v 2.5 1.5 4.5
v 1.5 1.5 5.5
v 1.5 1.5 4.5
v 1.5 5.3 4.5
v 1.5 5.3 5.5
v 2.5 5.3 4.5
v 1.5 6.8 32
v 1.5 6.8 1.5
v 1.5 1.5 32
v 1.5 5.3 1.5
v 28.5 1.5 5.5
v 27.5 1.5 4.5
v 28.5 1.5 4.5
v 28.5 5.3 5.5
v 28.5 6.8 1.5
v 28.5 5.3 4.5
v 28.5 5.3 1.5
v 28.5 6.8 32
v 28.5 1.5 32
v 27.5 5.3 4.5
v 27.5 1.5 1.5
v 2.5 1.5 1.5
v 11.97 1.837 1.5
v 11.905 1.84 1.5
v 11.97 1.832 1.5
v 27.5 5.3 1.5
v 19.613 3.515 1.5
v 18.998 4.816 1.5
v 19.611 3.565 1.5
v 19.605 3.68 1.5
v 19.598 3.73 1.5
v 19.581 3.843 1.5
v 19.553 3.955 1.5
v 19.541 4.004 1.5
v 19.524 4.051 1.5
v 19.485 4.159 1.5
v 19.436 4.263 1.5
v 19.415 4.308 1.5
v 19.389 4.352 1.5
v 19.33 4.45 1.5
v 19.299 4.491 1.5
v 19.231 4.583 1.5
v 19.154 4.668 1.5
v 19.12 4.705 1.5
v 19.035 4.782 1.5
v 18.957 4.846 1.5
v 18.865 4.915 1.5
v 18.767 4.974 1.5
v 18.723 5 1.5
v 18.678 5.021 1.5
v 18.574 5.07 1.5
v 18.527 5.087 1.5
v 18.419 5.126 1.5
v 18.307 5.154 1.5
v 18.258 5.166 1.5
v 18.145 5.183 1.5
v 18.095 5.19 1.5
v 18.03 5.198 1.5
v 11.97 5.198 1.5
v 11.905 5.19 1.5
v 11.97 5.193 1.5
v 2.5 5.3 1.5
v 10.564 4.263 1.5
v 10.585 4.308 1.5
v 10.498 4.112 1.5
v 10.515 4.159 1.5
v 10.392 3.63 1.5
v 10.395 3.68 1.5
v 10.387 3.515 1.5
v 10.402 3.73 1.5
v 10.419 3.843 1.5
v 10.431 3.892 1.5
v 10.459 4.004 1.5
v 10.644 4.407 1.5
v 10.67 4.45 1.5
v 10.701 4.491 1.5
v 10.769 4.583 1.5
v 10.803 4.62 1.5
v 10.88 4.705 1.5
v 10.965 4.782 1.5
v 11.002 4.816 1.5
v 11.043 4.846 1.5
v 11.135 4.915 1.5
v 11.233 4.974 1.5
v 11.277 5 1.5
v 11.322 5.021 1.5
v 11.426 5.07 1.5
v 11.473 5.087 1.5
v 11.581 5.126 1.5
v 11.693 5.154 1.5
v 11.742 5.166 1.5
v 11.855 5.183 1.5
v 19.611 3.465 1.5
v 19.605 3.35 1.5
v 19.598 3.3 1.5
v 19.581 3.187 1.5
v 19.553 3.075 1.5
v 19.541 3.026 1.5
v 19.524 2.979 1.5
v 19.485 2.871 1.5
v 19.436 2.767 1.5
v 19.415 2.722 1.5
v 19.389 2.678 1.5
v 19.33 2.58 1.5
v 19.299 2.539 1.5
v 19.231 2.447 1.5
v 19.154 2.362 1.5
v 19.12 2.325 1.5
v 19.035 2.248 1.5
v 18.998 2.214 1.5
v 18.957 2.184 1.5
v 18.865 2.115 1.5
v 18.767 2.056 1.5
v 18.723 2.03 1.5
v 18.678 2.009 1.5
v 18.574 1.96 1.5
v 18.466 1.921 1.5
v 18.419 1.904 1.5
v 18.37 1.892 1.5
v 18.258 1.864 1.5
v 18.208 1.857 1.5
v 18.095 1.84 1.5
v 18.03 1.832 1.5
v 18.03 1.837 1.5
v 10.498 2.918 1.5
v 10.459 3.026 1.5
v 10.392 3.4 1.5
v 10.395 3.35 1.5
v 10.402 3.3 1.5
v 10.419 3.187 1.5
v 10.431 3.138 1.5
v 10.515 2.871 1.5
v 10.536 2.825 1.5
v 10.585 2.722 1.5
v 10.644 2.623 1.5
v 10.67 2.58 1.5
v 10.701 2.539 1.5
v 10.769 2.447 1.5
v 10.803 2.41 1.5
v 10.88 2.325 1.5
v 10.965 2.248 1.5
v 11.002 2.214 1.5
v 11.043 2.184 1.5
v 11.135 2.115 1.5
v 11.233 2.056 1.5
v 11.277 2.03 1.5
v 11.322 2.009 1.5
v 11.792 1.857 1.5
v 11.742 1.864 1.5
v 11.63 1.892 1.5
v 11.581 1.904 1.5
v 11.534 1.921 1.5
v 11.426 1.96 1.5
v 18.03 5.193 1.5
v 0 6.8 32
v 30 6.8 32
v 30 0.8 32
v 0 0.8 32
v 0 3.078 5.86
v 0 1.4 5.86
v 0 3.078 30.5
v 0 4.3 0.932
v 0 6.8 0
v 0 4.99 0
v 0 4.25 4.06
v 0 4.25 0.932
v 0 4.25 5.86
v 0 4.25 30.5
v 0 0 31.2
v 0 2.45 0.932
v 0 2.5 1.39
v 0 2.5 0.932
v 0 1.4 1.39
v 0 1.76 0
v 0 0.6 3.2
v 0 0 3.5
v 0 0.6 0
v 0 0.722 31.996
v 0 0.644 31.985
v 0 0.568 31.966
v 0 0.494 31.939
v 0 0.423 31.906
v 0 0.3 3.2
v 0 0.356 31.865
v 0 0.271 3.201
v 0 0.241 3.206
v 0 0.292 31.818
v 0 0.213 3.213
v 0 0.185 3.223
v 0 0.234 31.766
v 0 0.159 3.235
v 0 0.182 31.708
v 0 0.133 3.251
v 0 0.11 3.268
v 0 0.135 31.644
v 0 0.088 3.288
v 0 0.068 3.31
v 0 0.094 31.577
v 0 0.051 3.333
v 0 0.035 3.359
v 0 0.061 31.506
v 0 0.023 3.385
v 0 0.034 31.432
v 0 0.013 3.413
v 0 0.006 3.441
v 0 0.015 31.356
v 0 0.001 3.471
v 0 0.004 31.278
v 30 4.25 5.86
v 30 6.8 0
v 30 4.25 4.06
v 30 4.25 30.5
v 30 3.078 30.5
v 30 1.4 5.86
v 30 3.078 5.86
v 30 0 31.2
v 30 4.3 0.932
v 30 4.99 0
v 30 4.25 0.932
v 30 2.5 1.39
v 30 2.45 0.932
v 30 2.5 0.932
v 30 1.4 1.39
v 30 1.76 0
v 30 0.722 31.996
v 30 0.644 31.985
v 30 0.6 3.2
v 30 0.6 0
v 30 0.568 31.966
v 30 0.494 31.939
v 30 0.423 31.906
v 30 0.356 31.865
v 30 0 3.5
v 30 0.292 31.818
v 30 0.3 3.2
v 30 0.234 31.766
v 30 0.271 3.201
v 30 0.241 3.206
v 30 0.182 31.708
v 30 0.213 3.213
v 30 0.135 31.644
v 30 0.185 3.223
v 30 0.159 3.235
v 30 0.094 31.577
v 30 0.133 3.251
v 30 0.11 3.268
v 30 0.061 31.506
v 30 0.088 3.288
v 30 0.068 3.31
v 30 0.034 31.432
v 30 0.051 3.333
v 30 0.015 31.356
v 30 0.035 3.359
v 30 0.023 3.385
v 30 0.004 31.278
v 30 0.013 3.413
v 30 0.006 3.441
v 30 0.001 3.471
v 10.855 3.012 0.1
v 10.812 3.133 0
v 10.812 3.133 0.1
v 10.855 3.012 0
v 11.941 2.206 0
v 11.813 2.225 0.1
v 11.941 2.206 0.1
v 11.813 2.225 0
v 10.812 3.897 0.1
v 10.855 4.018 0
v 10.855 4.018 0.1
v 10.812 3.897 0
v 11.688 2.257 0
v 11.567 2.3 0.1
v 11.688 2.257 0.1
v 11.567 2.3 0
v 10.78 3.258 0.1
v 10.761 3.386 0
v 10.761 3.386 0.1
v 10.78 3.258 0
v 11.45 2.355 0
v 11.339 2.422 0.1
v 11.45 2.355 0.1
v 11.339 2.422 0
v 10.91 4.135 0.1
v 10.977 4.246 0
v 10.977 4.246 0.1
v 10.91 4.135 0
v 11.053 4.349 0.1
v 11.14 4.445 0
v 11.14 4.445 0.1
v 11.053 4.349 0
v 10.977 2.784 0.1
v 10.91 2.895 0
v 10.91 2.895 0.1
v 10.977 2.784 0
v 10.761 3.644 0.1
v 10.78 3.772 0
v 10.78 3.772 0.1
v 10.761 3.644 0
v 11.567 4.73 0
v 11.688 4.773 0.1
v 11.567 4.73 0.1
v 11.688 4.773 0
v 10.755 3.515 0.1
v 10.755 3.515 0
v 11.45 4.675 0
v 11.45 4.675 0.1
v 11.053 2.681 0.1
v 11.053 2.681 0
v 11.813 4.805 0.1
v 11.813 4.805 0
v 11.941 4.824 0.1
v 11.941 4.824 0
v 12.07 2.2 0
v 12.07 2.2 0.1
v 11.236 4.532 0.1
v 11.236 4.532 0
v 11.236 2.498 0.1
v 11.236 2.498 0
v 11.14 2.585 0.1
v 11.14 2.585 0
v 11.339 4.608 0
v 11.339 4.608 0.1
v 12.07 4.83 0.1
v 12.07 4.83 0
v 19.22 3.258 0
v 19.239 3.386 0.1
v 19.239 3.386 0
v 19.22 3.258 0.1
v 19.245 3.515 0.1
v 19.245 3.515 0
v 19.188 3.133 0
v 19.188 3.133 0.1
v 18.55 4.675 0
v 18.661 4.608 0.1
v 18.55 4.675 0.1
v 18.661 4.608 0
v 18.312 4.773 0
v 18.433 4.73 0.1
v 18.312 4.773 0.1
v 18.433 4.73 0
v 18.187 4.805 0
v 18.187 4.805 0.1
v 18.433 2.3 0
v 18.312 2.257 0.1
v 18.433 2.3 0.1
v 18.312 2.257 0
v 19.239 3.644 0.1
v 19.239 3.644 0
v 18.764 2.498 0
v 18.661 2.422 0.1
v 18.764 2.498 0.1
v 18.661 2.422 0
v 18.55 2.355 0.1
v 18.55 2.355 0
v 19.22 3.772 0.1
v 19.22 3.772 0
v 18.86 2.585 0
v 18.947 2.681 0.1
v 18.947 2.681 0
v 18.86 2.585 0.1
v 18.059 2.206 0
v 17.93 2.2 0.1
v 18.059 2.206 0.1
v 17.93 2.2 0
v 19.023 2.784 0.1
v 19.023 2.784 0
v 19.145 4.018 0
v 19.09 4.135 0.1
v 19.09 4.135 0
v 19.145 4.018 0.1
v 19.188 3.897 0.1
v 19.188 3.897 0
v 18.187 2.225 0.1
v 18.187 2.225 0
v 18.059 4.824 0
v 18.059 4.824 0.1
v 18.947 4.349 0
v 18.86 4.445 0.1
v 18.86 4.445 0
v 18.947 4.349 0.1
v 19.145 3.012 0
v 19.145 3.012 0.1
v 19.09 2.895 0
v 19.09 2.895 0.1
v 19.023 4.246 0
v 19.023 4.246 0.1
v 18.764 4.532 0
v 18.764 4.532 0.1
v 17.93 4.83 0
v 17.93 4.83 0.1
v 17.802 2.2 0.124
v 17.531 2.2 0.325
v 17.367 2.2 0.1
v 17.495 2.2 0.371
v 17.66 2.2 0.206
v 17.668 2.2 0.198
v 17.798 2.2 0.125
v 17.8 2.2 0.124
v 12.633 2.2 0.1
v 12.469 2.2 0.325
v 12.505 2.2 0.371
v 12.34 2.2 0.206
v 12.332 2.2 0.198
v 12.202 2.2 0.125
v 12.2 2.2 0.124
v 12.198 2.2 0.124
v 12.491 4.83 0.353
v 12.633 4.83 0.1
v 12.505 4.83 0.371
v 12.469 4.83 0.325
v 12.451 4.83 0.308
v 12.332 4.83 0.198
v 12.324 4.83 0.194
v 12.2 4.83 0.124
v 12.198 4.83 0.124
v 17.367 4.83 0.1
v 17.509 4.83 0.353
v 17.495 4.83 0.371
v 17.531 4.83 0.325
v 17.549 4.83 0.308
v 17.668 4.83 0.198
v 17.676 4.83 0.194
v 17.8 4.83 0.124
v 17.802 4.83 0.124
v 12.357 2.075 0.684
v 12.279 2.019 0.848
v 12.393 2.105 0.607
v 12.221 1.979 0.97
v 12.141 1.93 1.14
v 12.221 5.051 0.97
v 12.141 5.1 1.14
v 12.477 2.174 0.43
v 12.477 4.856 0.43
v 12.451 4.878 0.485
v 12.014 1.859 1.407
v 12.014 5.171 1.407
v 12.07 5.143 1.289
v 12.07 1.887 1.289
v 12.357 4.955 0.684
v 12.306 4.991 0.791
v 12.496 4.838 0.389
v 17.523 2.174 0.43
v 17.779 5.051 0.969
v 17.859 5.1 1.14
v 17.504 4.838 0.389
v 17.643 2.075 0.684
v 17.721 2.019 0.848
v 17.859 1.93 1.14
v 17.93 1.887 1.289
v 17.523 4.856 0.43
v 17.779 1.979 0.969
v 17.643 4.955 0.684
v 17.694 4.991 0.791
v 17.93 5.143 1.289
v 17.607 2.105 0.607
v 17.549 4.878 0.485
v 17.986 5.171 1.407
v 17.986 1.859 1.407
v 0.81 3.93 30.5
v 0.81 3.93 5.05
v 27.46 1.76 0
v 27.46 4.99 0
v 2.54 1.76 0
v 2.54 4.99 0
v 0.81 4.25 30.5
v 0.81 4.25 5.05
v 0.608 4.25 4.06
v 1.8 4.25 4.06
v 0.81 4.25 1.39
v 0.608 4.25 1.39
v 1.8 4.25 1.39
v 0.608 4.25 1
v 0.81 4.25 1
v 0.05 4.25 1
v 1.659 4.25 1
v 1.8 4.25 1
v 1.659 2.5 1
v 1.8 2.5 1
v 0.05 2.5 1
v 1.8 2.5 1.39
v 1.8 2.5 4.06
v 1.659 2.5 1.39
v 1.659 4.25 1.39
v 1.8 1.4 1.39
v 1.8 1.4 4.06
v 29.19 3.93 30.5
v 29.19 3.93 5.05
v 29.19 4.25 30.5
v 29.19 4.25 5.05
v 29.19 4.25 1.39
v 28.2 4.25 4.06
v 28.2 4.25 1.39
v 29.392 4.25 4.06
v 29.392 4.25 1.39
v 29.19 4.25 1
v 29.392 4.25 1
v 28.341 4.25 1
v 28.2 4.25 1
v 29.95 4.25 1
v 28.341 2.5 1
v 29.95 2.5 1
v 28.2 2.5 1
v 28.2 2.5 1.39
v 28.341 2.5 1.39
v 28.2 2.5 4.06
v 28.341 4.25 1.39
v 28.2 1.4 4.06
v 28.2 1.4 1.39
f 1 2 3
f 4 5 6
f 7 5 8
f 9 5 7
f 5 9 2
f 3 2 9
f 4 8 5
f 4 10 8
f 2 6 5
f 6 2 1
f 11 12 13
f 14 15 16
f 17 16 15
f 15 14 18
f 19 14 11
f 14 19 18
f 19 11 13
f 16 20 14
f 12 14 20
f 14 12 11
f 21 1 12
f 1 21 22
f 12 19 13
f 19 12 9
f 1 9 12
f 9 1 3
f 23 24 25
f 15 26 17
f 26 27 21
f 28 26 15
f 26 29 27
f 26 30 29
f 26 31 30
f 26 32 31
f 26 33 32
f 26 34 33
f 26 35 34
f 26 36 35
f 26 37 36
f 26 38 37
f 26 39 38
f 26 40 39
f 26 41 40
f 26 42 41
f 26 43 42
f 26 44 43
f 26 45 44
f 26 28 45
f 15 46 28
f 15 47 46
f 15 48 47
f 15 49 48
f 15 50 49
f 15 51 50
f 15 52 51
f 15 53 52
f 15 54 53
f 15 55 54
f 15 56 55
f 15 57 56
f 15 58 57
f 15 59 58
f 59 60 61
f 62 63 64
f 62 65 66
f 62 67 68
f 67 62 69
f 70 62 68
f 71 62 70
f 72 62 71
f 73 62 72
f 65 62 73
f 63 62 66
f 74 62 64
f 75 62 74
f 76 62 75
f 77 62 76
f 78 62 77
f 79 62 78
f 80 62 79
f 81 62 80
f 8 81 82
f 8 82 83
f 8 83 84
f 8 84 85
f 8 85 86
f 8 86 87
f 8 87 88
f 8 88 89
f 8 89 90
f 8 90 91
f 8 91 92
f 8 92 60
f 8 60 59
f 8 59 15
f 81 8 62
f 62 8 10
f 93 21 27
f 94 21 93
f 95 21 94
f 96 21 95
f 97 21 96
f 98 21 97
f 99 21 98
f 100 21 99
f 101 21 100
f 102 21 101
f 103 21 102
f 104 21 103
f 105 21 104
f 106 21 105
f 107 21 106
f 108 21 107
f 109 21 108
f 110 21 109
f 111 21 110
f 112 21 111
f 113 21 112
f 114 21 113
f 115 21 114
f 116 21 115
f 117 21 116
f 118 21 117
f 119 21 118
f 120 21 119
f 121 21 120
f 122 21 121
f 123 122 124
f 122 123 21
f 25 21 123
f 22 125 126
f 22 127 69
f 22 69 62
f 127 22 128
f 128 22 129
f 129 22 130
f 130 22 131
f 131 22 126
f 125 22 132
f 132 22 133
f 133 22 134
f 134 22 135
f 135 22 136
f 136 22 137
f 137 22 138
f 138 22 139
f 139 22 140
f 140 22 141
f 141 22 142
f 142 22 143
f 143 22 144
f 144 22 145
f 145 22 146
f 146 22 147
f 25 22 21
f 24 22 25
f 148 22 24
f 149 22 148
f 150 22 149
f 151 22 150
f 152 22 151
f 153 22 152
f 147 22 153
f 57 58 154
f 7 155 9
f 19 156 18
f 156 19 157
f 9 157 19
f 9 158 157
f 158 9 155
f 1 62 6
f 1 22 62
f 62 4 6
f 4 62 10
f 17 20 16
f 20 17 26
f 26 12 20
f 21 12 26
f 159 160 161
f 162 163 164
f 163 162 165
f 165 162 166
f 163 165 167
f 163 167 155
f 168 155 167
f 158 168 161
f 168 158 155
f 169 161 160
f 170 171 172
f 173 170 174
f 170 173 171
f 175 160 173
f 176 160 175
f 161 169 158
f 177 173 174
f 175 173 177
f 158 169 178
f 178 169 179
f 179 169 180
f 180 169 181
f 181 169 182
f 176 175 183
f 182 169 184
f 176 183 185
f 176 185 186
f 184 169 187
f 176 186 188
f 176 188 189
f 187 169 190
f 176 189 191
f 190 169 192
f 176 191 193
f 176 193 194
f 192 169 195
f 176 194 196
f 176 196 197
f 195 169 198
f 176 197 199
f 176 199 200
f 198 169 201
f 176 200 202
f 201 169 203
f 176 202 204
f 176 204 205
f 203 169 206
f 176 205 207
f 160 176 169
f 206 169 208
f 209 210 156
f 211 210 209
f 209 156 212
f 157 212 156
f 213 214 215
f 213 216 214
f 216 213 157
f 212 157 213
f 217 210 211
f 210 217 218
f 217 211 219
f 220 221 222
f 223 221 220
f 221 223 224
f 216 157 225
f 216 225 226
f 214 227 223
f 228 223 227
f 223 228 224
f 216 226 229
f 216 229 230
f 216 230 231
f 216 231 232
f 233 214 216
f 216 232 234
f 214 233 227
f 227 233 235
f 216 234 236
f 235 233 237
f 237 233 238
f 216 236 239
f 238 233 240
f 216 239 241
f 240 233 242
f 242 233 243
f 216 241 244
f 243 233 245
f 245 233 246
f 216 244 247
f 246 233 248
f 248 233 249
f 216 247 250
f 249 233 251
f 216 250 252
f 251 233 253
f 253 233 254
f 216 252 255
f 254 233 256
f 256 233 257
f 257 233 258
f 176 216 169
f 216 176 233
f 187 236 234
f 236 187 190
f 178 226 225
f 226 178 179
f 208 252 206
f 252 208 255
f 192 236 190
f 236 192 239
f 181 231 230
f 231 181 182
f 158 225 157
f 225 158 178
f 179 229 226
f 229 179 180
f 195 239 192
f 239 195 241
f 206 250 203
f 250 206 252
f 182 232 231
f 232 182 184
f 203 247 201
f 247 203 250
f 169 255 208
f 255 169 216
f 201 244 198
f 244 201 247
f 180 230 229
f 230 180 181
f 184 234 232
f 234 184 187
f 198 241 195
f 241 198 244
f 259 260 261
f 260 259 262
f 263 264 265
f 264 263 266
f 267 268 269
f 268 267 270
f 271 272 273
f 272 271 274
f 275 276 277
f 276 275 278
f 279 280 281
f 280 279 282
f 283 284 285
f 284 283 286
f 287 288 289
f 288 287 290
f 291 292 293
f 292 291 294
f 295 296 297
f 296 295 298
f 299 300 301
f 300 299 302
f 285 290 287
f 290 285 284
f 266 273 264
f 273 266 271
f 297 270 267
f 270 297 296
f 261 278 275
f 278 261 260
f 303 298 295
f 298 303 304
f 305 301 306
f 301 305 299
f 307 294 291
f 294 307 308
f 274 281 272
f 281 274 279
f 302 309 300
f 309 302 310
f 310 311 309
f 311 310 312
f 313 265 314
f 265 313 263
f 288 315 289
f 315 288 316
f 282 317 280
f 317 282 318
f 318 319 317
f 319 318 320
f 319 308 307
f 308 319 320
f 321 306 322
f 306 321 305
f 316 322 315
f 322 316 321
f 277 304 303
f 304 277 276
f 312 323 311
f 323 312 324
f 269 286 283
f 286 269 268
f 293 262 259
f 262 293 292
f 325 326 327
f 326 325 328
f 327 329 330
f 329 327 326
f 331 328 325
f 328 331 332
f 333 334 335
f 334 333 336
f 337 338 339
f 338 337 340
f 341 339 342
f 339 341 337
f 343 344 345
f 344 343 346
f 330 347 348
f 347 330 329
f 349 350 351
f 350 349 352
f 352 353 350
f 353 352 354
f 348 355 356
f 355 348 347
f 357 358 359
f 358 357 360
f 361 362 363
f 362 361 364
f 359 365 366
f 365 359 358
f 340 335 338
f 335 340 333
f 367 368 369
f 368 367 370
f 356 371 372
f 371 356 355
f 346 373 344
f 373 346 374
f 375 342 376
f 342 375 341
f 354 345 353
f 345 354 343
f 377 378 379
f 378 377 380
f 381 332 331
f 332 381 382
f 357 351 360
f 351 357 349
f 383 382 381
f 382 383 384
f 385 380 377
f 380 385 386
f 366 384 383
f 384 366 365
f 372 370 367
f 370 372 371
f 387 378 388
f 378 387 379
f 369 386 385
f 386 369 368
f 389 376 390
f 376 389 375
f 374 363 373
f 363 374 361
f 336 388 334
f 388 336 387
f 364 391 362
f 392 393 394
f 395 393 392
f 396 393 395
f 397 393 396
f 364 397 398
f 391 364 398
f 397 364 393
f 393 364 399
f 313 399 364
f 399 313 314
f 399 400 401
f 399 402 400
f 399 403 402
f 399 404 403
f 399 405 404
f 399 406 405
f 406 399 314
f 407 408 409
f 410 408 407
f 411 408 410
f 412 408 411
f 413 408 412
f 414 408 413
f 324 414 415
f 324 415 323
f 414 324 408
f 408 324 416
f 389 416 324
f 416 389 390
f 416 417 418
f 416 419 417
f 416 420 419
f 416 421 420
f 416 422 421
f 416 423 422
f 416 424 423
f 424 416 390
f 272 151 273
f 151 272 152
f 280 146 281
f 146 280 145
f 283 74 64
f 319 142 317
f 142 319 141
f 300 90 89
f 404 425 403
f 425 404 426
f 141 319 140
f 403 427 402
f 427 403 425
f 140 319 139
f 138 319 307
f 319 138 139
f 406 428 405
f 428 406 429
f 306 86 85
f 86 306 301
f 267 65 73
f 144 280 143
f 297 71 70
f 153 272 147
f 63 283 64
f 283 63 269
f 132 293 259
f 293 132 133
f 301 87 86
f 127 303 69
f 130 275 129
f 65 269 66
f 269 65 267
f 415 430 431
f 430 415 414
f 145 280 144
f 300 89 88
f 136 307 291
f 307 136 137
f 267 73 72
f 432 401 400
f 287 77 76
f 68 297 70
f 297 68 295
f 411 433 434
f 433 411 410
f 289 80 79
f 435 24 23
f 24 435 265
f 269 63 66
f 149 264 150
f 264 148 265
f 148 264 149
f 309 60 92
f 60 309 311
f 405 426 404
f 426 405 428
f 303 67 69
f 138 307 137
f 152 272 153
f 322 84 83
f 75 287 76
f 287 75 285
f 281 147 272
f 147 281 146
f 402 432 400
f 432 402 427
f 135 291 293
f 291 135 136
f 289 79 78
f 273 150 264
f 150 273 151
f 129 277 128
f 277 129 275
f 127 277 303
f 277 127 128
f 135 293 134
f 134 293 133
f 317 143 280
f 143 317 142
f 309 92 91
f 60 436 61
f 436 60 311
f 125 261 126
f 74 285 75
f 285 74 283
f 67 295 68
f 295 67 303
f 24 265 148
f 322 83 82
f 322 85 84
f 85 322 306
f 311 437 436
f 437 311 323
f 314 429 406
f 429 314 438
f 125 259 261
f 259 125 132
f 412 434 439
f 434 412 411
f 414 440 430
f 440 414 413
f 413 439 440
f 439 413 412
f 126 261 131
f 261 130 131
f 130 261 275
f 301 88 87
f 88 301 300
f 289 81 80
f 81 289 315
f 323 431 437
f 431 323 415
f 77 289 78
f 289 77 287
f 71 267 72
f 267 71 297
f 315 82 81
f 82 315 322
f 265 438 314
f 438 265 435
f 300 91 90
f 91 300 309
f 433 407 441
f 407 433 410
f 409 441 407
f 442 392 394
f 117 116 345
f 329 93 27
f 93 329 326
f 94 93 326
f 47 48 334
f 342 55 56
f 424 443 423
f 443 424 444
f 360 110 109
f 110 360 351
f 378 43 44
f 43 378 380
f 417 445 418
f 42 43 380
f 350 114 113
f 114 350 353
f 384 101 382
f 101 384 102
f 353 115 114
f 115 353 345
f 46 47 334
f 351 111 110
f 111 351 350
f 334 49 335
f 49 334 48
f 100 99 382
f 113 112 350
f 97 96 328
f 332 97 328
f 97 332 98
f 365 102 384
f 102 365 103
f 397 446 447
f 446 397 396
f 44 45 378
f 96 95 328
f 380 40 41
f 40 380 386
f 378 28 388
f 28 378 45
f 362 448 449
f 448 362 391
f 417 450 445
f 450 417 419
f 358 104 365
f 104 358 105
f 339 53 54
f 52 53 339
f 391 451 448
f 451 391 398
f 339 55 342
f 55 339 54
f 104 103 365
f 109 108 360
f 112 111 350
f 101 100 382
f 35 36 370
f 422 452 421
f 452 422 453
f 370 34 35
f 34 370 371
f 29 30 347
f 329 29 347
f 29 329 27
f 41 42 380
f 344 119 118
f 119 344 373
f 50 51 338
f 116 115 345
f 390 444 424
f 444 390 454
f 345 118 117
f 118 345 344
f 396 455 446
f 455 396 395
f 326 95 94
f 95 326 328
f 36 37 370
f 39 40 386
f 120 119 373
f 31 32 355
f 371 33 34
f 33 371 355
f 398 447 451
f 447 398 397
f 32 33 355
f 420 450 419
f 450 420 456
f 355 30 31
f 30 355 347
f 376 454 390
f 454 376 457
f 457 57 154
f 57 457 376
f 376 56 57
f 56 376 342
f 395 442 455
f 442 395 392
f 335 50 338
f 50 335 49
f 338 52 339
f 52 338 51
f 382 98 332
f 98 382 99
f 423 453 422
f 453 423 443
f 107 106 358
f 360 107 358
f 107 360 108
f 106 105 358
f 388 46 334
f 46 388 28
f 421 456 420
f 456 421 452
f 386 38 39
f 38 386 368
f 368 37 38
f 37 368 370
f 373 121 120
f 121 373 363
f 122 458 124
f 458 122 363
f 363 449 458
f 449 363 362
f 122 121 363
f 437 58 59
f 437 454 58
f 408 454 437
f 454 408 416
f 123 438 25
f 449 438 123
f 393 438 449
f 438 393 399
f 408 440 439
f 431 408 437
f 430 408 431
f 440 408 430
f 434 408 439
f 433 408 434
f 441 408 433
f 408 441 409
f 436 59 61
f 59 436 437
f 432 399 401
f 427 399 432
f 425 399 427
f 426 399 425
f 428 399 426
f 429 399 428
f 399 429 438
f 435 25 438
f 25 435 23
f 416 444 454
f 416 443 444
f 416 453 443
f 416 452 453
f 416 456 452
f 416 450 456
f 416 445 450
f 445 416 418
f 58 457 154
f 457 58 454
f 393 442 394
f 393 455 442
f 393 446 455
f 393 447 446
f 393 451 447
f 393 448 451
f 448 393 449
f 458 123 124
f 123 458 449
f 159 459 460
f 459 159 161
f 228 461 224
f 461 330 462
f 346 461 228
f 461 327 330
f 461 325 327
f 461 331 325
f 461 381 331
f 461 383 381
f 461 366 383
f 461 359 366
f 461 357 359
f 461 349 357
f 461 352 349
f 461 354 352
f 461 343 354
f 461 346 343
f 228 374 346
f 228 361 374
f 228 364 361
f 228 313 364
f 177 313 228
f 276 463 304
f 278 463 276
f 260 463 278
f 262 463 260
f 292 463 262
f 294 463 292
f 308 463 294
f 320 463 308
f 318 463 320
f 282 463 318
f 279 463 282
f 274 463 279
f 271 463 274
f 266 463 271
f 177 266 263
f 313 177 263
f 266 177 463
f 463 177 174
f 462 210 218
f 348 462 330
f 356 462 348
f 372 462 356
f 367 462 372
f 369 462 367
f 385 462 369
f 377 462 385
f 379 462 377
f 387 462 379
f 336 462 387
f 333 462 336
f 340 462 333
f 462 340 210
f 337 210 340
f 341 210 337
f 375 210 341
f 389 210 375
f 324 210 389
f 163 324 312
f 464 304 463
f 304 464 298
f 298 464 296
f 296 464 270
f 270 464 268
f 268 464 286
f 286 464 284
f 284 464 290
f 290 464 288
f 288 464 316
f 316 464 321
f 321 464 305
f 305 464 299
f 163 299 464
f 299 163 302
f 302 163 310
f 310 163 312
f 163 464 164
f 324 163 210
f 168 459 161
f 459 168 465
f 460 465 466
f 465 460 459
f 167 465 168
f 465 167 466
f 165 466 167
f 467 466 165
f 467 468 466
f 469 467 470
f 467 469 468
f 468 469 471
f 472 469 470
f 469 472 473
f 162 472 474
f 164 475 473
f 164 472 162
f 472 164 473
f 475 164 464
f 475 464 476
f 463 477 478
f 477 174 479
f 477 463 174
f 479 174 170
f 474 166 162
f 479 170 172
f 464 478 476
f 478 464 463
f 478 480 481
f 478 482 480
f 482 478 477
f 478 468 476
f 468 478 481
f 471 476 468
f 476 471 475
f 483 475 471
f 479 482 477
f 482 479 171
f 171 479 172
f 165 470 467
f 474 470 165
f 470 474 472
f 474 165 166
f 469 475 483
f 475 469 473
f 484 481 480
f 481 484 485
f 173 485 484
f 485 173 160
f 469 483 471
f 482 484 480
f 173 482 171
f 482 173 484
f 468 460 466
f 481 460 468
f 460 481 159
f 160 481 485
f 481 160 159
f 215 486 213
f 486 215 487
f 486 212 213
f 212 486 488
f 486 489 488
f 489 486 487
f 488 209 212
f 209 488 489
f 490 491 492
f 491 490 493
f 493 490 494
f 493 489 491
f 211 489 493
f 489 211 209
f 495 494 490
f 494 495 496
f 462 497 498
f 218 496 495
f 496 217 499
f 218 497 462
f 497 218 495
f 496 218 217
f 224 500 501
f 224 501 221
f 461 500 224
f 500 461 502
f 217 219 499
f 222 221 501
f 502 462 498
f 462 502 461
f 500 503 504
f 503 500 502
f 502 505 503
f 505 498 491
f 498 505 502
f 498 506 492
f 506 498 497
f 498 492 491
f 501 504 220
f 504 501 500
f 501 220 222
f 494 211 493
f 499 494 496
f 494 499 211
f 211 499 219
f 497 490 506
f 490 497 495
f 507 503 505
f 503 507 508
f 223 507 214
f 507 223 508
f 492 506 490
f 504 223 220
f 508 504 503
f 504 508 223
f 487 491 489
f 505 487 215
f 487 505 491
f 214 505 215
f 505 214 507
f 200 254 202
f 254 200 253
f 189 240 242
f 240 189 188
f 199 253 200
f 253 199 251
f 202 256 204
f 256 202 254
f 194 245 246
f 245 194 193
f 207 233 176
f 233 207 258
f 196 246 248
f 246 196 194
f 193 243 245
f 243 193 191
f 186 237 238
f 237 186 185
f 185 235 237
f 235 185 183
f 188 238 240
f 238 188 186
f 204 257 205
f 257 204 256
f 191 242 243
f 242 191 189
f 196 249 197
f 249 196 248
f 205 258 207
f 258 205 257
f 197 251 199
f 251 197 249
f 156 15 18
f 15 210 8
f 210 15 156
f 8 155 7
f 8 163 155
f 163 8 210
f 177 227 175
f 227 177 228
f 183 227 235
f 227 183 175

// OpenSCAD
// Parametric Expansion Card
//  An OpenSCAD implementation of a basic enclosure of an Expansion Card for
//  use with Framework products like the Framework Laptop.
//
//  See https://frame.work for more information about Framework products and
//  additional documentation around Expansion Cards.

// Parametric Expansion Card © 2021 by Nirav Patel at Framework Computer LLC
// is licensed under Attribution 4.0 International. 
// To view a copy of this license, visit http://creativecommons.org/licenses/by/4.0/

// The basic dimensions of an Expansion Card
base = [30.0, 32.0, 6.8];
// The default wall thickness
side_wall = 1.5;

// Size and location of the typical PCB
pcb_gap = 0.5;
pcb = [26.0, 30.0, 0.8];
pcb_h = 3.05;

// USB-C plug dimensions
usb_c_r = 1.315;
usb_c_w = 5.86 + usb_c_r * 2;
usb_c_h = 2.2;

rail_h = 4.25; // to top of rail

// Boss locations matching the other Framework Expansion Cards
boss_y = 10.5;
boss_x = 3.7;

// The rail cutout in the sides of the card
module rail(make_printable) {
    rail_depth = 0.81;
    rail_flat_h = 0.32;

    mirror([0, 1, 0]) {

        // The rail that holds the card
        bottom_angle = 43.54;
        difference() {
            union() {
                translate([rail_depth, 0, -rail_flat_h]) rotate([0, 180 + bottom_angle, 0]) cube([2, base[1] - side_wall, 2]);
                translate([-2 + rail_depth, 0, -rail_flat_h]) cube([2, base[1] - side_wall, rail_flat_h]);
            }
            translate([-5 + rail_depth, 0, 0]) cube([5, base[1] - side_wall, 5]);
        }

        pyramid_b = 3.23 * sqrt(2);
        pyramid_t = 1.75 * sqrt(2);
        pyramid_h = 1.0;
        pyramid_inset = 1.3 + 0.5;
        pyramid_step = 3.06;

        // The ramps to make slotting into the latch smooth
        translate([-1.75 / 2 + pyramid_inset, 0, -1.75 / 2]) rotate([-90, 0, 0]) rotate([0, 0, 45]) {
                    cylinder(r1=pyramid_b / 2, r2=pyramid_t / 2, h=pyramid_h, $fn=4);
                    cylinder(r=pyramid_t / 2, h=pyramid_step + pyramid_h, $fn=4);
                    translate([-0.1, 0.1, 0]) cylinder(r=pyramid_t / 2, h=pyramid_step + pyramid_h, $fn=4);
                }

        latch_l = 2.67;
        latch_d = pyramid_inset;
        latch_h = 2.85;
        latch_wall = 1.39;

        // The pocket that the latch bar drops into, including a 45 degree cut for printability
        translate([0, latch_wall, -latch_h]) cube([latch_d, latch_l, latch_h]);
        if (make_printable) {
            translate([latch_d, latch_wall + latch_l, -latch_h]) rotate([0, 0, -180 + 45]) translate([0, -latch_l, 0]) cube([latch_d * 2, latch_l, latch_h]);
        }
    }
}

// A simple 45 degree rib to improve printability
module rib(thickness, height) {
    translate([-thickness / 2, 0, 0]) difference() {
            cube([thickness, height, height]);
            translate([-thickness / 2, height, 0]) rotate([45, 0, 0]) cube([thickness * 2, height * 2, height * 2]);
        }
}

// A simple cylinder cutout to fillet edges
module fillet(radius, length) {
    translate([length, 0, 0]) rotate([0, -90, 0]) difference() {
                cube([radius, radius, length]);
                translate([radius, radius, -1]) cylinder(h=length + 2, r=radius, $fn=64);
            }
}

// The cutout for the USB-C plug
module usb_c_cutout(open_top) {
    // The plug is "pushed in" by an extra 0.6 to account for 3d printing tolerances
    translate([-usb_c_w / 2 + usb_c_r, 7 - 10 + 0.6, usb_c_r]) rotate([-90, 0, 0]) union() {
                translate([0, usb_c_r, 0]) cylinder(r=usb_c_r, h=10, $fn=64);
                translate([usb_c_w - usb_c_r * 2, usb_c_r, 0]) cylinder(r=usb_c_r, h=10, $fn=64);
                cube([usb_c_w - usb_c_r * 2, usb_c_r * 2, 10]);

                // Cutout for the pin side of the shell that expands out
                translate([0, usb_c_r, 0]) cylinder(r2=usb_c_r, r1=3.84 / 2, h=10 - 7.7, $fn=64);
                translate([usb_c_w - usb_c_r * 2, usb_c_r, 0]) cylinder(r2=usb_c_r, r1=3.84 / 2, h=10 - 7.7, $fn=64);
                translate([usb_c_w / 2 - usb_c_r, usb_c_r, 0]) scale([1.8, 1, 1]) rotate([0, 0, 45]) cylinder(r2=usb_c_r * sqrt(2), r1=3.84 / 2 * sqrt(2), h=10 - 7.7, $fn=4);

                // If the card drops in from the top rather than sliding in from the front,
                // cut out a slot for the USB-C plug to drop into.
                if (open_top) {
                    translate([-usb_c_r, -10 + usb_c_r, 0]) cube([usb_c_w, 10, 10]);
                }
            }
}

// Quarter section of a sphere, used as a clip
module qsphere(radius = 1) {
    difference() {
        sphere(r=radius, $fn=32);
        translate([-radius - 1, -radius - 1, -radius]) cube([radius * 2 + 2, radius * 2 + 2, radius]);
        translate([0, -radius - 1, -radius - 1]) cube([radius, radius * 2 + 2, radius * 2 + 2]);
    }
}

// The screw boss for the PCB, optionally with space for a threaded insert
module boss(radius, use_insert, make_printable) {
    difference() {
        cylinder(r=radius, h=pcb_h, $fn=64);
        if (use_insert) {
            // Use threaded insert
            translate([0, 0, side_wall]) cylinder(r=1.5, h=pcb_h, $fn=64);
        } else {
            translate([0, 0, side_wall]) cylinder(r=0.75, h=pcb_h, $fn=64);
        }
    }

    // Add a rib for printability
    if (make_printable) {
        translate([0, radius - 0.1, 0]) rib(1, pcb_h);
    }
}

// Incomplete implementation of a lid to use with this shell
module expansion_card_lid() {
    gap = 0.25;
    union() {
        translate([side_wall + gap, side_wall + gap, base[2] - side_wall]) cube([base[0] - side_wall * 2 - gap * 2, base[1] - side_wall * 2 - gap * 2, side_wall]);
        difference() {
            translate([base[0] / 2 - usb_c_w / 2 + gap, base[1] - side_wall - gap, usb_c_r + usb_c_h]) cube([usb_c_w - gap * 2, side_wall + gap, base[2] - (usb_c_r + usb_c_h)]);
            translate([base[0] / 2, base[1], usb_c_r + usb_c_h]) usb_c_cutout(false);
        }
    }
}

// A basic, printable Expansion Card enclosure
//  open_end - A boolean to make the end of the card that is exposed when inserted open
//  make_printable - Adds ribs to improve printability
//  pcb_mount - The method the PCB is held in with, "boss" for self-threading screws,
//            "boss_insert" for fastener with a threaded insert,
//            "clip" for a fastener-less clip, or
//            "" for no PCB mounting structure
module expansion_card_base(open_end, make_printable, pcb_mount = "boss") {
    // Hollowing of the inside
    extra = 0.1;
    inner = [base[0] - side_wall * 2, base[1] - side_wall * 2, base[2] - side_wall + extra];
    boss_radius = 2.3;

    difference() {
        cube(base);

        difference() {
            notch = 1.0;
            notch_l = 3.0;
            notch_h = 3.8;
            // The main hollow
            translate([side_wall, open_end ? 0 : side_wall, side_wall]) cube([inner[0], open_end ? inner[1] + side_wall : inner[1], inner[2]]);
            // Extra wall thickness where the latch cutouts are
            translate([side_wall, inner[1] + side_wall - notch_l, side_wall + notch_h / 2]) rotate([0, 0, -90]) rotate([0, 90, 0]) rib(notch_h, notch);
            translate([side_wall, inner[1] + side_wall - notch_l, side_wall]) cube([notch, notch_l, notch_h]);
            translate([inner[0] + side_wall, inner[1] + side_wall - notch_l, side_wall + notch_h / 2]) rotate([0, 0, 180]) rotate([0, 90, 0]) rib(notch_h, notch);
            translate([inner[0] + side_wall - notch, inner[1] + side_wall - notch_l, side_wall]) cube([notch, notch_l, notch_h]);
        }

        // The rounded front edge to match the laptop
        edge_r = 0.8;
        fillet(edge_r, base[0]);

        // The USB-C plug cutout
        translate([base[0] / 2, base[1], usb_c_r + usb_c_h]) usb_c_cutout(!open_end);

        // The sliding rails
        translate([0, base[1], rail_h]) rail(make_printable);
        translate([base[0], base[1], rail_h]) mirror([1, 0, 0]) rail(make_printable);

        // Cut out the end of what is normally the aluminum cover
        ledge_cut = 0.6;
        ledge_cut_d = 3.2;
        ledge_fillet_r = 0.3;

        translate([0, base[1] - ledge_cut_d, 0]) cube([base[0], ledge_cut_d, ledge_cut]);
        // The fillet on that cover
        translate([base[0], base[1] - ledge_cut_d, 0]) rotate([0, 0, 180]) fillet(ledge_cut / 2, base[0]);
    }

    if (pcb_mount == "boss" || pcb_mount == "boss_insert") {
        // Add the screw bosses
        translate([boss_x, boss_y, 0]) boss(boss_radius, pcb_mount == "boss_insert", make_printable);
        translate([base[0] - boss_x, boss_y, 0]) boss(boss_radius, pcb_mount == "boss_insert", make_printable);
    } else if (pcb_mount == "clip") {
        clip_w = 1.5;
        clip_gap = 0.5;
        translate([boss_x - boss_radius, boss_y - boss_radius, 0]) {
            cube([boss_radius * 2, boss_radius * 2, pcb_h]);
            if (make_printable)
                translate([boss_radius, boss_radius * 2, 0]) rib(boss_radius * 2, pcb_h);
            translate([0, boss_radius - clip_w, pcb_h + pcb[2] + clip_gap]) rotate([0, 0, 180]) qsphere(clip_w);
        }
        translate([base[0] - boss_x - boss_radius, boss_y - boss_radius, 0]) {
            cube([boss_radius * 2, boss_radius * 2, pcb_h]);
            if (make_printable)
                translate([boss_radius, boss_radius * 2, 0]) rib(boss_radius * 2, pcb_h);
            translate([boss_radius * 2, boss_radius - clip_w, pcb_h + pcb[2] + clip_gap]) qsphere(clip_w);
        }
    }
}

// Rotate into a printable orientation
rotate([-90, 0, 0]) translate([0, -base[1], 0]) expansion_card_base(open_end=true, make_printable=true, pcb_mount="");
